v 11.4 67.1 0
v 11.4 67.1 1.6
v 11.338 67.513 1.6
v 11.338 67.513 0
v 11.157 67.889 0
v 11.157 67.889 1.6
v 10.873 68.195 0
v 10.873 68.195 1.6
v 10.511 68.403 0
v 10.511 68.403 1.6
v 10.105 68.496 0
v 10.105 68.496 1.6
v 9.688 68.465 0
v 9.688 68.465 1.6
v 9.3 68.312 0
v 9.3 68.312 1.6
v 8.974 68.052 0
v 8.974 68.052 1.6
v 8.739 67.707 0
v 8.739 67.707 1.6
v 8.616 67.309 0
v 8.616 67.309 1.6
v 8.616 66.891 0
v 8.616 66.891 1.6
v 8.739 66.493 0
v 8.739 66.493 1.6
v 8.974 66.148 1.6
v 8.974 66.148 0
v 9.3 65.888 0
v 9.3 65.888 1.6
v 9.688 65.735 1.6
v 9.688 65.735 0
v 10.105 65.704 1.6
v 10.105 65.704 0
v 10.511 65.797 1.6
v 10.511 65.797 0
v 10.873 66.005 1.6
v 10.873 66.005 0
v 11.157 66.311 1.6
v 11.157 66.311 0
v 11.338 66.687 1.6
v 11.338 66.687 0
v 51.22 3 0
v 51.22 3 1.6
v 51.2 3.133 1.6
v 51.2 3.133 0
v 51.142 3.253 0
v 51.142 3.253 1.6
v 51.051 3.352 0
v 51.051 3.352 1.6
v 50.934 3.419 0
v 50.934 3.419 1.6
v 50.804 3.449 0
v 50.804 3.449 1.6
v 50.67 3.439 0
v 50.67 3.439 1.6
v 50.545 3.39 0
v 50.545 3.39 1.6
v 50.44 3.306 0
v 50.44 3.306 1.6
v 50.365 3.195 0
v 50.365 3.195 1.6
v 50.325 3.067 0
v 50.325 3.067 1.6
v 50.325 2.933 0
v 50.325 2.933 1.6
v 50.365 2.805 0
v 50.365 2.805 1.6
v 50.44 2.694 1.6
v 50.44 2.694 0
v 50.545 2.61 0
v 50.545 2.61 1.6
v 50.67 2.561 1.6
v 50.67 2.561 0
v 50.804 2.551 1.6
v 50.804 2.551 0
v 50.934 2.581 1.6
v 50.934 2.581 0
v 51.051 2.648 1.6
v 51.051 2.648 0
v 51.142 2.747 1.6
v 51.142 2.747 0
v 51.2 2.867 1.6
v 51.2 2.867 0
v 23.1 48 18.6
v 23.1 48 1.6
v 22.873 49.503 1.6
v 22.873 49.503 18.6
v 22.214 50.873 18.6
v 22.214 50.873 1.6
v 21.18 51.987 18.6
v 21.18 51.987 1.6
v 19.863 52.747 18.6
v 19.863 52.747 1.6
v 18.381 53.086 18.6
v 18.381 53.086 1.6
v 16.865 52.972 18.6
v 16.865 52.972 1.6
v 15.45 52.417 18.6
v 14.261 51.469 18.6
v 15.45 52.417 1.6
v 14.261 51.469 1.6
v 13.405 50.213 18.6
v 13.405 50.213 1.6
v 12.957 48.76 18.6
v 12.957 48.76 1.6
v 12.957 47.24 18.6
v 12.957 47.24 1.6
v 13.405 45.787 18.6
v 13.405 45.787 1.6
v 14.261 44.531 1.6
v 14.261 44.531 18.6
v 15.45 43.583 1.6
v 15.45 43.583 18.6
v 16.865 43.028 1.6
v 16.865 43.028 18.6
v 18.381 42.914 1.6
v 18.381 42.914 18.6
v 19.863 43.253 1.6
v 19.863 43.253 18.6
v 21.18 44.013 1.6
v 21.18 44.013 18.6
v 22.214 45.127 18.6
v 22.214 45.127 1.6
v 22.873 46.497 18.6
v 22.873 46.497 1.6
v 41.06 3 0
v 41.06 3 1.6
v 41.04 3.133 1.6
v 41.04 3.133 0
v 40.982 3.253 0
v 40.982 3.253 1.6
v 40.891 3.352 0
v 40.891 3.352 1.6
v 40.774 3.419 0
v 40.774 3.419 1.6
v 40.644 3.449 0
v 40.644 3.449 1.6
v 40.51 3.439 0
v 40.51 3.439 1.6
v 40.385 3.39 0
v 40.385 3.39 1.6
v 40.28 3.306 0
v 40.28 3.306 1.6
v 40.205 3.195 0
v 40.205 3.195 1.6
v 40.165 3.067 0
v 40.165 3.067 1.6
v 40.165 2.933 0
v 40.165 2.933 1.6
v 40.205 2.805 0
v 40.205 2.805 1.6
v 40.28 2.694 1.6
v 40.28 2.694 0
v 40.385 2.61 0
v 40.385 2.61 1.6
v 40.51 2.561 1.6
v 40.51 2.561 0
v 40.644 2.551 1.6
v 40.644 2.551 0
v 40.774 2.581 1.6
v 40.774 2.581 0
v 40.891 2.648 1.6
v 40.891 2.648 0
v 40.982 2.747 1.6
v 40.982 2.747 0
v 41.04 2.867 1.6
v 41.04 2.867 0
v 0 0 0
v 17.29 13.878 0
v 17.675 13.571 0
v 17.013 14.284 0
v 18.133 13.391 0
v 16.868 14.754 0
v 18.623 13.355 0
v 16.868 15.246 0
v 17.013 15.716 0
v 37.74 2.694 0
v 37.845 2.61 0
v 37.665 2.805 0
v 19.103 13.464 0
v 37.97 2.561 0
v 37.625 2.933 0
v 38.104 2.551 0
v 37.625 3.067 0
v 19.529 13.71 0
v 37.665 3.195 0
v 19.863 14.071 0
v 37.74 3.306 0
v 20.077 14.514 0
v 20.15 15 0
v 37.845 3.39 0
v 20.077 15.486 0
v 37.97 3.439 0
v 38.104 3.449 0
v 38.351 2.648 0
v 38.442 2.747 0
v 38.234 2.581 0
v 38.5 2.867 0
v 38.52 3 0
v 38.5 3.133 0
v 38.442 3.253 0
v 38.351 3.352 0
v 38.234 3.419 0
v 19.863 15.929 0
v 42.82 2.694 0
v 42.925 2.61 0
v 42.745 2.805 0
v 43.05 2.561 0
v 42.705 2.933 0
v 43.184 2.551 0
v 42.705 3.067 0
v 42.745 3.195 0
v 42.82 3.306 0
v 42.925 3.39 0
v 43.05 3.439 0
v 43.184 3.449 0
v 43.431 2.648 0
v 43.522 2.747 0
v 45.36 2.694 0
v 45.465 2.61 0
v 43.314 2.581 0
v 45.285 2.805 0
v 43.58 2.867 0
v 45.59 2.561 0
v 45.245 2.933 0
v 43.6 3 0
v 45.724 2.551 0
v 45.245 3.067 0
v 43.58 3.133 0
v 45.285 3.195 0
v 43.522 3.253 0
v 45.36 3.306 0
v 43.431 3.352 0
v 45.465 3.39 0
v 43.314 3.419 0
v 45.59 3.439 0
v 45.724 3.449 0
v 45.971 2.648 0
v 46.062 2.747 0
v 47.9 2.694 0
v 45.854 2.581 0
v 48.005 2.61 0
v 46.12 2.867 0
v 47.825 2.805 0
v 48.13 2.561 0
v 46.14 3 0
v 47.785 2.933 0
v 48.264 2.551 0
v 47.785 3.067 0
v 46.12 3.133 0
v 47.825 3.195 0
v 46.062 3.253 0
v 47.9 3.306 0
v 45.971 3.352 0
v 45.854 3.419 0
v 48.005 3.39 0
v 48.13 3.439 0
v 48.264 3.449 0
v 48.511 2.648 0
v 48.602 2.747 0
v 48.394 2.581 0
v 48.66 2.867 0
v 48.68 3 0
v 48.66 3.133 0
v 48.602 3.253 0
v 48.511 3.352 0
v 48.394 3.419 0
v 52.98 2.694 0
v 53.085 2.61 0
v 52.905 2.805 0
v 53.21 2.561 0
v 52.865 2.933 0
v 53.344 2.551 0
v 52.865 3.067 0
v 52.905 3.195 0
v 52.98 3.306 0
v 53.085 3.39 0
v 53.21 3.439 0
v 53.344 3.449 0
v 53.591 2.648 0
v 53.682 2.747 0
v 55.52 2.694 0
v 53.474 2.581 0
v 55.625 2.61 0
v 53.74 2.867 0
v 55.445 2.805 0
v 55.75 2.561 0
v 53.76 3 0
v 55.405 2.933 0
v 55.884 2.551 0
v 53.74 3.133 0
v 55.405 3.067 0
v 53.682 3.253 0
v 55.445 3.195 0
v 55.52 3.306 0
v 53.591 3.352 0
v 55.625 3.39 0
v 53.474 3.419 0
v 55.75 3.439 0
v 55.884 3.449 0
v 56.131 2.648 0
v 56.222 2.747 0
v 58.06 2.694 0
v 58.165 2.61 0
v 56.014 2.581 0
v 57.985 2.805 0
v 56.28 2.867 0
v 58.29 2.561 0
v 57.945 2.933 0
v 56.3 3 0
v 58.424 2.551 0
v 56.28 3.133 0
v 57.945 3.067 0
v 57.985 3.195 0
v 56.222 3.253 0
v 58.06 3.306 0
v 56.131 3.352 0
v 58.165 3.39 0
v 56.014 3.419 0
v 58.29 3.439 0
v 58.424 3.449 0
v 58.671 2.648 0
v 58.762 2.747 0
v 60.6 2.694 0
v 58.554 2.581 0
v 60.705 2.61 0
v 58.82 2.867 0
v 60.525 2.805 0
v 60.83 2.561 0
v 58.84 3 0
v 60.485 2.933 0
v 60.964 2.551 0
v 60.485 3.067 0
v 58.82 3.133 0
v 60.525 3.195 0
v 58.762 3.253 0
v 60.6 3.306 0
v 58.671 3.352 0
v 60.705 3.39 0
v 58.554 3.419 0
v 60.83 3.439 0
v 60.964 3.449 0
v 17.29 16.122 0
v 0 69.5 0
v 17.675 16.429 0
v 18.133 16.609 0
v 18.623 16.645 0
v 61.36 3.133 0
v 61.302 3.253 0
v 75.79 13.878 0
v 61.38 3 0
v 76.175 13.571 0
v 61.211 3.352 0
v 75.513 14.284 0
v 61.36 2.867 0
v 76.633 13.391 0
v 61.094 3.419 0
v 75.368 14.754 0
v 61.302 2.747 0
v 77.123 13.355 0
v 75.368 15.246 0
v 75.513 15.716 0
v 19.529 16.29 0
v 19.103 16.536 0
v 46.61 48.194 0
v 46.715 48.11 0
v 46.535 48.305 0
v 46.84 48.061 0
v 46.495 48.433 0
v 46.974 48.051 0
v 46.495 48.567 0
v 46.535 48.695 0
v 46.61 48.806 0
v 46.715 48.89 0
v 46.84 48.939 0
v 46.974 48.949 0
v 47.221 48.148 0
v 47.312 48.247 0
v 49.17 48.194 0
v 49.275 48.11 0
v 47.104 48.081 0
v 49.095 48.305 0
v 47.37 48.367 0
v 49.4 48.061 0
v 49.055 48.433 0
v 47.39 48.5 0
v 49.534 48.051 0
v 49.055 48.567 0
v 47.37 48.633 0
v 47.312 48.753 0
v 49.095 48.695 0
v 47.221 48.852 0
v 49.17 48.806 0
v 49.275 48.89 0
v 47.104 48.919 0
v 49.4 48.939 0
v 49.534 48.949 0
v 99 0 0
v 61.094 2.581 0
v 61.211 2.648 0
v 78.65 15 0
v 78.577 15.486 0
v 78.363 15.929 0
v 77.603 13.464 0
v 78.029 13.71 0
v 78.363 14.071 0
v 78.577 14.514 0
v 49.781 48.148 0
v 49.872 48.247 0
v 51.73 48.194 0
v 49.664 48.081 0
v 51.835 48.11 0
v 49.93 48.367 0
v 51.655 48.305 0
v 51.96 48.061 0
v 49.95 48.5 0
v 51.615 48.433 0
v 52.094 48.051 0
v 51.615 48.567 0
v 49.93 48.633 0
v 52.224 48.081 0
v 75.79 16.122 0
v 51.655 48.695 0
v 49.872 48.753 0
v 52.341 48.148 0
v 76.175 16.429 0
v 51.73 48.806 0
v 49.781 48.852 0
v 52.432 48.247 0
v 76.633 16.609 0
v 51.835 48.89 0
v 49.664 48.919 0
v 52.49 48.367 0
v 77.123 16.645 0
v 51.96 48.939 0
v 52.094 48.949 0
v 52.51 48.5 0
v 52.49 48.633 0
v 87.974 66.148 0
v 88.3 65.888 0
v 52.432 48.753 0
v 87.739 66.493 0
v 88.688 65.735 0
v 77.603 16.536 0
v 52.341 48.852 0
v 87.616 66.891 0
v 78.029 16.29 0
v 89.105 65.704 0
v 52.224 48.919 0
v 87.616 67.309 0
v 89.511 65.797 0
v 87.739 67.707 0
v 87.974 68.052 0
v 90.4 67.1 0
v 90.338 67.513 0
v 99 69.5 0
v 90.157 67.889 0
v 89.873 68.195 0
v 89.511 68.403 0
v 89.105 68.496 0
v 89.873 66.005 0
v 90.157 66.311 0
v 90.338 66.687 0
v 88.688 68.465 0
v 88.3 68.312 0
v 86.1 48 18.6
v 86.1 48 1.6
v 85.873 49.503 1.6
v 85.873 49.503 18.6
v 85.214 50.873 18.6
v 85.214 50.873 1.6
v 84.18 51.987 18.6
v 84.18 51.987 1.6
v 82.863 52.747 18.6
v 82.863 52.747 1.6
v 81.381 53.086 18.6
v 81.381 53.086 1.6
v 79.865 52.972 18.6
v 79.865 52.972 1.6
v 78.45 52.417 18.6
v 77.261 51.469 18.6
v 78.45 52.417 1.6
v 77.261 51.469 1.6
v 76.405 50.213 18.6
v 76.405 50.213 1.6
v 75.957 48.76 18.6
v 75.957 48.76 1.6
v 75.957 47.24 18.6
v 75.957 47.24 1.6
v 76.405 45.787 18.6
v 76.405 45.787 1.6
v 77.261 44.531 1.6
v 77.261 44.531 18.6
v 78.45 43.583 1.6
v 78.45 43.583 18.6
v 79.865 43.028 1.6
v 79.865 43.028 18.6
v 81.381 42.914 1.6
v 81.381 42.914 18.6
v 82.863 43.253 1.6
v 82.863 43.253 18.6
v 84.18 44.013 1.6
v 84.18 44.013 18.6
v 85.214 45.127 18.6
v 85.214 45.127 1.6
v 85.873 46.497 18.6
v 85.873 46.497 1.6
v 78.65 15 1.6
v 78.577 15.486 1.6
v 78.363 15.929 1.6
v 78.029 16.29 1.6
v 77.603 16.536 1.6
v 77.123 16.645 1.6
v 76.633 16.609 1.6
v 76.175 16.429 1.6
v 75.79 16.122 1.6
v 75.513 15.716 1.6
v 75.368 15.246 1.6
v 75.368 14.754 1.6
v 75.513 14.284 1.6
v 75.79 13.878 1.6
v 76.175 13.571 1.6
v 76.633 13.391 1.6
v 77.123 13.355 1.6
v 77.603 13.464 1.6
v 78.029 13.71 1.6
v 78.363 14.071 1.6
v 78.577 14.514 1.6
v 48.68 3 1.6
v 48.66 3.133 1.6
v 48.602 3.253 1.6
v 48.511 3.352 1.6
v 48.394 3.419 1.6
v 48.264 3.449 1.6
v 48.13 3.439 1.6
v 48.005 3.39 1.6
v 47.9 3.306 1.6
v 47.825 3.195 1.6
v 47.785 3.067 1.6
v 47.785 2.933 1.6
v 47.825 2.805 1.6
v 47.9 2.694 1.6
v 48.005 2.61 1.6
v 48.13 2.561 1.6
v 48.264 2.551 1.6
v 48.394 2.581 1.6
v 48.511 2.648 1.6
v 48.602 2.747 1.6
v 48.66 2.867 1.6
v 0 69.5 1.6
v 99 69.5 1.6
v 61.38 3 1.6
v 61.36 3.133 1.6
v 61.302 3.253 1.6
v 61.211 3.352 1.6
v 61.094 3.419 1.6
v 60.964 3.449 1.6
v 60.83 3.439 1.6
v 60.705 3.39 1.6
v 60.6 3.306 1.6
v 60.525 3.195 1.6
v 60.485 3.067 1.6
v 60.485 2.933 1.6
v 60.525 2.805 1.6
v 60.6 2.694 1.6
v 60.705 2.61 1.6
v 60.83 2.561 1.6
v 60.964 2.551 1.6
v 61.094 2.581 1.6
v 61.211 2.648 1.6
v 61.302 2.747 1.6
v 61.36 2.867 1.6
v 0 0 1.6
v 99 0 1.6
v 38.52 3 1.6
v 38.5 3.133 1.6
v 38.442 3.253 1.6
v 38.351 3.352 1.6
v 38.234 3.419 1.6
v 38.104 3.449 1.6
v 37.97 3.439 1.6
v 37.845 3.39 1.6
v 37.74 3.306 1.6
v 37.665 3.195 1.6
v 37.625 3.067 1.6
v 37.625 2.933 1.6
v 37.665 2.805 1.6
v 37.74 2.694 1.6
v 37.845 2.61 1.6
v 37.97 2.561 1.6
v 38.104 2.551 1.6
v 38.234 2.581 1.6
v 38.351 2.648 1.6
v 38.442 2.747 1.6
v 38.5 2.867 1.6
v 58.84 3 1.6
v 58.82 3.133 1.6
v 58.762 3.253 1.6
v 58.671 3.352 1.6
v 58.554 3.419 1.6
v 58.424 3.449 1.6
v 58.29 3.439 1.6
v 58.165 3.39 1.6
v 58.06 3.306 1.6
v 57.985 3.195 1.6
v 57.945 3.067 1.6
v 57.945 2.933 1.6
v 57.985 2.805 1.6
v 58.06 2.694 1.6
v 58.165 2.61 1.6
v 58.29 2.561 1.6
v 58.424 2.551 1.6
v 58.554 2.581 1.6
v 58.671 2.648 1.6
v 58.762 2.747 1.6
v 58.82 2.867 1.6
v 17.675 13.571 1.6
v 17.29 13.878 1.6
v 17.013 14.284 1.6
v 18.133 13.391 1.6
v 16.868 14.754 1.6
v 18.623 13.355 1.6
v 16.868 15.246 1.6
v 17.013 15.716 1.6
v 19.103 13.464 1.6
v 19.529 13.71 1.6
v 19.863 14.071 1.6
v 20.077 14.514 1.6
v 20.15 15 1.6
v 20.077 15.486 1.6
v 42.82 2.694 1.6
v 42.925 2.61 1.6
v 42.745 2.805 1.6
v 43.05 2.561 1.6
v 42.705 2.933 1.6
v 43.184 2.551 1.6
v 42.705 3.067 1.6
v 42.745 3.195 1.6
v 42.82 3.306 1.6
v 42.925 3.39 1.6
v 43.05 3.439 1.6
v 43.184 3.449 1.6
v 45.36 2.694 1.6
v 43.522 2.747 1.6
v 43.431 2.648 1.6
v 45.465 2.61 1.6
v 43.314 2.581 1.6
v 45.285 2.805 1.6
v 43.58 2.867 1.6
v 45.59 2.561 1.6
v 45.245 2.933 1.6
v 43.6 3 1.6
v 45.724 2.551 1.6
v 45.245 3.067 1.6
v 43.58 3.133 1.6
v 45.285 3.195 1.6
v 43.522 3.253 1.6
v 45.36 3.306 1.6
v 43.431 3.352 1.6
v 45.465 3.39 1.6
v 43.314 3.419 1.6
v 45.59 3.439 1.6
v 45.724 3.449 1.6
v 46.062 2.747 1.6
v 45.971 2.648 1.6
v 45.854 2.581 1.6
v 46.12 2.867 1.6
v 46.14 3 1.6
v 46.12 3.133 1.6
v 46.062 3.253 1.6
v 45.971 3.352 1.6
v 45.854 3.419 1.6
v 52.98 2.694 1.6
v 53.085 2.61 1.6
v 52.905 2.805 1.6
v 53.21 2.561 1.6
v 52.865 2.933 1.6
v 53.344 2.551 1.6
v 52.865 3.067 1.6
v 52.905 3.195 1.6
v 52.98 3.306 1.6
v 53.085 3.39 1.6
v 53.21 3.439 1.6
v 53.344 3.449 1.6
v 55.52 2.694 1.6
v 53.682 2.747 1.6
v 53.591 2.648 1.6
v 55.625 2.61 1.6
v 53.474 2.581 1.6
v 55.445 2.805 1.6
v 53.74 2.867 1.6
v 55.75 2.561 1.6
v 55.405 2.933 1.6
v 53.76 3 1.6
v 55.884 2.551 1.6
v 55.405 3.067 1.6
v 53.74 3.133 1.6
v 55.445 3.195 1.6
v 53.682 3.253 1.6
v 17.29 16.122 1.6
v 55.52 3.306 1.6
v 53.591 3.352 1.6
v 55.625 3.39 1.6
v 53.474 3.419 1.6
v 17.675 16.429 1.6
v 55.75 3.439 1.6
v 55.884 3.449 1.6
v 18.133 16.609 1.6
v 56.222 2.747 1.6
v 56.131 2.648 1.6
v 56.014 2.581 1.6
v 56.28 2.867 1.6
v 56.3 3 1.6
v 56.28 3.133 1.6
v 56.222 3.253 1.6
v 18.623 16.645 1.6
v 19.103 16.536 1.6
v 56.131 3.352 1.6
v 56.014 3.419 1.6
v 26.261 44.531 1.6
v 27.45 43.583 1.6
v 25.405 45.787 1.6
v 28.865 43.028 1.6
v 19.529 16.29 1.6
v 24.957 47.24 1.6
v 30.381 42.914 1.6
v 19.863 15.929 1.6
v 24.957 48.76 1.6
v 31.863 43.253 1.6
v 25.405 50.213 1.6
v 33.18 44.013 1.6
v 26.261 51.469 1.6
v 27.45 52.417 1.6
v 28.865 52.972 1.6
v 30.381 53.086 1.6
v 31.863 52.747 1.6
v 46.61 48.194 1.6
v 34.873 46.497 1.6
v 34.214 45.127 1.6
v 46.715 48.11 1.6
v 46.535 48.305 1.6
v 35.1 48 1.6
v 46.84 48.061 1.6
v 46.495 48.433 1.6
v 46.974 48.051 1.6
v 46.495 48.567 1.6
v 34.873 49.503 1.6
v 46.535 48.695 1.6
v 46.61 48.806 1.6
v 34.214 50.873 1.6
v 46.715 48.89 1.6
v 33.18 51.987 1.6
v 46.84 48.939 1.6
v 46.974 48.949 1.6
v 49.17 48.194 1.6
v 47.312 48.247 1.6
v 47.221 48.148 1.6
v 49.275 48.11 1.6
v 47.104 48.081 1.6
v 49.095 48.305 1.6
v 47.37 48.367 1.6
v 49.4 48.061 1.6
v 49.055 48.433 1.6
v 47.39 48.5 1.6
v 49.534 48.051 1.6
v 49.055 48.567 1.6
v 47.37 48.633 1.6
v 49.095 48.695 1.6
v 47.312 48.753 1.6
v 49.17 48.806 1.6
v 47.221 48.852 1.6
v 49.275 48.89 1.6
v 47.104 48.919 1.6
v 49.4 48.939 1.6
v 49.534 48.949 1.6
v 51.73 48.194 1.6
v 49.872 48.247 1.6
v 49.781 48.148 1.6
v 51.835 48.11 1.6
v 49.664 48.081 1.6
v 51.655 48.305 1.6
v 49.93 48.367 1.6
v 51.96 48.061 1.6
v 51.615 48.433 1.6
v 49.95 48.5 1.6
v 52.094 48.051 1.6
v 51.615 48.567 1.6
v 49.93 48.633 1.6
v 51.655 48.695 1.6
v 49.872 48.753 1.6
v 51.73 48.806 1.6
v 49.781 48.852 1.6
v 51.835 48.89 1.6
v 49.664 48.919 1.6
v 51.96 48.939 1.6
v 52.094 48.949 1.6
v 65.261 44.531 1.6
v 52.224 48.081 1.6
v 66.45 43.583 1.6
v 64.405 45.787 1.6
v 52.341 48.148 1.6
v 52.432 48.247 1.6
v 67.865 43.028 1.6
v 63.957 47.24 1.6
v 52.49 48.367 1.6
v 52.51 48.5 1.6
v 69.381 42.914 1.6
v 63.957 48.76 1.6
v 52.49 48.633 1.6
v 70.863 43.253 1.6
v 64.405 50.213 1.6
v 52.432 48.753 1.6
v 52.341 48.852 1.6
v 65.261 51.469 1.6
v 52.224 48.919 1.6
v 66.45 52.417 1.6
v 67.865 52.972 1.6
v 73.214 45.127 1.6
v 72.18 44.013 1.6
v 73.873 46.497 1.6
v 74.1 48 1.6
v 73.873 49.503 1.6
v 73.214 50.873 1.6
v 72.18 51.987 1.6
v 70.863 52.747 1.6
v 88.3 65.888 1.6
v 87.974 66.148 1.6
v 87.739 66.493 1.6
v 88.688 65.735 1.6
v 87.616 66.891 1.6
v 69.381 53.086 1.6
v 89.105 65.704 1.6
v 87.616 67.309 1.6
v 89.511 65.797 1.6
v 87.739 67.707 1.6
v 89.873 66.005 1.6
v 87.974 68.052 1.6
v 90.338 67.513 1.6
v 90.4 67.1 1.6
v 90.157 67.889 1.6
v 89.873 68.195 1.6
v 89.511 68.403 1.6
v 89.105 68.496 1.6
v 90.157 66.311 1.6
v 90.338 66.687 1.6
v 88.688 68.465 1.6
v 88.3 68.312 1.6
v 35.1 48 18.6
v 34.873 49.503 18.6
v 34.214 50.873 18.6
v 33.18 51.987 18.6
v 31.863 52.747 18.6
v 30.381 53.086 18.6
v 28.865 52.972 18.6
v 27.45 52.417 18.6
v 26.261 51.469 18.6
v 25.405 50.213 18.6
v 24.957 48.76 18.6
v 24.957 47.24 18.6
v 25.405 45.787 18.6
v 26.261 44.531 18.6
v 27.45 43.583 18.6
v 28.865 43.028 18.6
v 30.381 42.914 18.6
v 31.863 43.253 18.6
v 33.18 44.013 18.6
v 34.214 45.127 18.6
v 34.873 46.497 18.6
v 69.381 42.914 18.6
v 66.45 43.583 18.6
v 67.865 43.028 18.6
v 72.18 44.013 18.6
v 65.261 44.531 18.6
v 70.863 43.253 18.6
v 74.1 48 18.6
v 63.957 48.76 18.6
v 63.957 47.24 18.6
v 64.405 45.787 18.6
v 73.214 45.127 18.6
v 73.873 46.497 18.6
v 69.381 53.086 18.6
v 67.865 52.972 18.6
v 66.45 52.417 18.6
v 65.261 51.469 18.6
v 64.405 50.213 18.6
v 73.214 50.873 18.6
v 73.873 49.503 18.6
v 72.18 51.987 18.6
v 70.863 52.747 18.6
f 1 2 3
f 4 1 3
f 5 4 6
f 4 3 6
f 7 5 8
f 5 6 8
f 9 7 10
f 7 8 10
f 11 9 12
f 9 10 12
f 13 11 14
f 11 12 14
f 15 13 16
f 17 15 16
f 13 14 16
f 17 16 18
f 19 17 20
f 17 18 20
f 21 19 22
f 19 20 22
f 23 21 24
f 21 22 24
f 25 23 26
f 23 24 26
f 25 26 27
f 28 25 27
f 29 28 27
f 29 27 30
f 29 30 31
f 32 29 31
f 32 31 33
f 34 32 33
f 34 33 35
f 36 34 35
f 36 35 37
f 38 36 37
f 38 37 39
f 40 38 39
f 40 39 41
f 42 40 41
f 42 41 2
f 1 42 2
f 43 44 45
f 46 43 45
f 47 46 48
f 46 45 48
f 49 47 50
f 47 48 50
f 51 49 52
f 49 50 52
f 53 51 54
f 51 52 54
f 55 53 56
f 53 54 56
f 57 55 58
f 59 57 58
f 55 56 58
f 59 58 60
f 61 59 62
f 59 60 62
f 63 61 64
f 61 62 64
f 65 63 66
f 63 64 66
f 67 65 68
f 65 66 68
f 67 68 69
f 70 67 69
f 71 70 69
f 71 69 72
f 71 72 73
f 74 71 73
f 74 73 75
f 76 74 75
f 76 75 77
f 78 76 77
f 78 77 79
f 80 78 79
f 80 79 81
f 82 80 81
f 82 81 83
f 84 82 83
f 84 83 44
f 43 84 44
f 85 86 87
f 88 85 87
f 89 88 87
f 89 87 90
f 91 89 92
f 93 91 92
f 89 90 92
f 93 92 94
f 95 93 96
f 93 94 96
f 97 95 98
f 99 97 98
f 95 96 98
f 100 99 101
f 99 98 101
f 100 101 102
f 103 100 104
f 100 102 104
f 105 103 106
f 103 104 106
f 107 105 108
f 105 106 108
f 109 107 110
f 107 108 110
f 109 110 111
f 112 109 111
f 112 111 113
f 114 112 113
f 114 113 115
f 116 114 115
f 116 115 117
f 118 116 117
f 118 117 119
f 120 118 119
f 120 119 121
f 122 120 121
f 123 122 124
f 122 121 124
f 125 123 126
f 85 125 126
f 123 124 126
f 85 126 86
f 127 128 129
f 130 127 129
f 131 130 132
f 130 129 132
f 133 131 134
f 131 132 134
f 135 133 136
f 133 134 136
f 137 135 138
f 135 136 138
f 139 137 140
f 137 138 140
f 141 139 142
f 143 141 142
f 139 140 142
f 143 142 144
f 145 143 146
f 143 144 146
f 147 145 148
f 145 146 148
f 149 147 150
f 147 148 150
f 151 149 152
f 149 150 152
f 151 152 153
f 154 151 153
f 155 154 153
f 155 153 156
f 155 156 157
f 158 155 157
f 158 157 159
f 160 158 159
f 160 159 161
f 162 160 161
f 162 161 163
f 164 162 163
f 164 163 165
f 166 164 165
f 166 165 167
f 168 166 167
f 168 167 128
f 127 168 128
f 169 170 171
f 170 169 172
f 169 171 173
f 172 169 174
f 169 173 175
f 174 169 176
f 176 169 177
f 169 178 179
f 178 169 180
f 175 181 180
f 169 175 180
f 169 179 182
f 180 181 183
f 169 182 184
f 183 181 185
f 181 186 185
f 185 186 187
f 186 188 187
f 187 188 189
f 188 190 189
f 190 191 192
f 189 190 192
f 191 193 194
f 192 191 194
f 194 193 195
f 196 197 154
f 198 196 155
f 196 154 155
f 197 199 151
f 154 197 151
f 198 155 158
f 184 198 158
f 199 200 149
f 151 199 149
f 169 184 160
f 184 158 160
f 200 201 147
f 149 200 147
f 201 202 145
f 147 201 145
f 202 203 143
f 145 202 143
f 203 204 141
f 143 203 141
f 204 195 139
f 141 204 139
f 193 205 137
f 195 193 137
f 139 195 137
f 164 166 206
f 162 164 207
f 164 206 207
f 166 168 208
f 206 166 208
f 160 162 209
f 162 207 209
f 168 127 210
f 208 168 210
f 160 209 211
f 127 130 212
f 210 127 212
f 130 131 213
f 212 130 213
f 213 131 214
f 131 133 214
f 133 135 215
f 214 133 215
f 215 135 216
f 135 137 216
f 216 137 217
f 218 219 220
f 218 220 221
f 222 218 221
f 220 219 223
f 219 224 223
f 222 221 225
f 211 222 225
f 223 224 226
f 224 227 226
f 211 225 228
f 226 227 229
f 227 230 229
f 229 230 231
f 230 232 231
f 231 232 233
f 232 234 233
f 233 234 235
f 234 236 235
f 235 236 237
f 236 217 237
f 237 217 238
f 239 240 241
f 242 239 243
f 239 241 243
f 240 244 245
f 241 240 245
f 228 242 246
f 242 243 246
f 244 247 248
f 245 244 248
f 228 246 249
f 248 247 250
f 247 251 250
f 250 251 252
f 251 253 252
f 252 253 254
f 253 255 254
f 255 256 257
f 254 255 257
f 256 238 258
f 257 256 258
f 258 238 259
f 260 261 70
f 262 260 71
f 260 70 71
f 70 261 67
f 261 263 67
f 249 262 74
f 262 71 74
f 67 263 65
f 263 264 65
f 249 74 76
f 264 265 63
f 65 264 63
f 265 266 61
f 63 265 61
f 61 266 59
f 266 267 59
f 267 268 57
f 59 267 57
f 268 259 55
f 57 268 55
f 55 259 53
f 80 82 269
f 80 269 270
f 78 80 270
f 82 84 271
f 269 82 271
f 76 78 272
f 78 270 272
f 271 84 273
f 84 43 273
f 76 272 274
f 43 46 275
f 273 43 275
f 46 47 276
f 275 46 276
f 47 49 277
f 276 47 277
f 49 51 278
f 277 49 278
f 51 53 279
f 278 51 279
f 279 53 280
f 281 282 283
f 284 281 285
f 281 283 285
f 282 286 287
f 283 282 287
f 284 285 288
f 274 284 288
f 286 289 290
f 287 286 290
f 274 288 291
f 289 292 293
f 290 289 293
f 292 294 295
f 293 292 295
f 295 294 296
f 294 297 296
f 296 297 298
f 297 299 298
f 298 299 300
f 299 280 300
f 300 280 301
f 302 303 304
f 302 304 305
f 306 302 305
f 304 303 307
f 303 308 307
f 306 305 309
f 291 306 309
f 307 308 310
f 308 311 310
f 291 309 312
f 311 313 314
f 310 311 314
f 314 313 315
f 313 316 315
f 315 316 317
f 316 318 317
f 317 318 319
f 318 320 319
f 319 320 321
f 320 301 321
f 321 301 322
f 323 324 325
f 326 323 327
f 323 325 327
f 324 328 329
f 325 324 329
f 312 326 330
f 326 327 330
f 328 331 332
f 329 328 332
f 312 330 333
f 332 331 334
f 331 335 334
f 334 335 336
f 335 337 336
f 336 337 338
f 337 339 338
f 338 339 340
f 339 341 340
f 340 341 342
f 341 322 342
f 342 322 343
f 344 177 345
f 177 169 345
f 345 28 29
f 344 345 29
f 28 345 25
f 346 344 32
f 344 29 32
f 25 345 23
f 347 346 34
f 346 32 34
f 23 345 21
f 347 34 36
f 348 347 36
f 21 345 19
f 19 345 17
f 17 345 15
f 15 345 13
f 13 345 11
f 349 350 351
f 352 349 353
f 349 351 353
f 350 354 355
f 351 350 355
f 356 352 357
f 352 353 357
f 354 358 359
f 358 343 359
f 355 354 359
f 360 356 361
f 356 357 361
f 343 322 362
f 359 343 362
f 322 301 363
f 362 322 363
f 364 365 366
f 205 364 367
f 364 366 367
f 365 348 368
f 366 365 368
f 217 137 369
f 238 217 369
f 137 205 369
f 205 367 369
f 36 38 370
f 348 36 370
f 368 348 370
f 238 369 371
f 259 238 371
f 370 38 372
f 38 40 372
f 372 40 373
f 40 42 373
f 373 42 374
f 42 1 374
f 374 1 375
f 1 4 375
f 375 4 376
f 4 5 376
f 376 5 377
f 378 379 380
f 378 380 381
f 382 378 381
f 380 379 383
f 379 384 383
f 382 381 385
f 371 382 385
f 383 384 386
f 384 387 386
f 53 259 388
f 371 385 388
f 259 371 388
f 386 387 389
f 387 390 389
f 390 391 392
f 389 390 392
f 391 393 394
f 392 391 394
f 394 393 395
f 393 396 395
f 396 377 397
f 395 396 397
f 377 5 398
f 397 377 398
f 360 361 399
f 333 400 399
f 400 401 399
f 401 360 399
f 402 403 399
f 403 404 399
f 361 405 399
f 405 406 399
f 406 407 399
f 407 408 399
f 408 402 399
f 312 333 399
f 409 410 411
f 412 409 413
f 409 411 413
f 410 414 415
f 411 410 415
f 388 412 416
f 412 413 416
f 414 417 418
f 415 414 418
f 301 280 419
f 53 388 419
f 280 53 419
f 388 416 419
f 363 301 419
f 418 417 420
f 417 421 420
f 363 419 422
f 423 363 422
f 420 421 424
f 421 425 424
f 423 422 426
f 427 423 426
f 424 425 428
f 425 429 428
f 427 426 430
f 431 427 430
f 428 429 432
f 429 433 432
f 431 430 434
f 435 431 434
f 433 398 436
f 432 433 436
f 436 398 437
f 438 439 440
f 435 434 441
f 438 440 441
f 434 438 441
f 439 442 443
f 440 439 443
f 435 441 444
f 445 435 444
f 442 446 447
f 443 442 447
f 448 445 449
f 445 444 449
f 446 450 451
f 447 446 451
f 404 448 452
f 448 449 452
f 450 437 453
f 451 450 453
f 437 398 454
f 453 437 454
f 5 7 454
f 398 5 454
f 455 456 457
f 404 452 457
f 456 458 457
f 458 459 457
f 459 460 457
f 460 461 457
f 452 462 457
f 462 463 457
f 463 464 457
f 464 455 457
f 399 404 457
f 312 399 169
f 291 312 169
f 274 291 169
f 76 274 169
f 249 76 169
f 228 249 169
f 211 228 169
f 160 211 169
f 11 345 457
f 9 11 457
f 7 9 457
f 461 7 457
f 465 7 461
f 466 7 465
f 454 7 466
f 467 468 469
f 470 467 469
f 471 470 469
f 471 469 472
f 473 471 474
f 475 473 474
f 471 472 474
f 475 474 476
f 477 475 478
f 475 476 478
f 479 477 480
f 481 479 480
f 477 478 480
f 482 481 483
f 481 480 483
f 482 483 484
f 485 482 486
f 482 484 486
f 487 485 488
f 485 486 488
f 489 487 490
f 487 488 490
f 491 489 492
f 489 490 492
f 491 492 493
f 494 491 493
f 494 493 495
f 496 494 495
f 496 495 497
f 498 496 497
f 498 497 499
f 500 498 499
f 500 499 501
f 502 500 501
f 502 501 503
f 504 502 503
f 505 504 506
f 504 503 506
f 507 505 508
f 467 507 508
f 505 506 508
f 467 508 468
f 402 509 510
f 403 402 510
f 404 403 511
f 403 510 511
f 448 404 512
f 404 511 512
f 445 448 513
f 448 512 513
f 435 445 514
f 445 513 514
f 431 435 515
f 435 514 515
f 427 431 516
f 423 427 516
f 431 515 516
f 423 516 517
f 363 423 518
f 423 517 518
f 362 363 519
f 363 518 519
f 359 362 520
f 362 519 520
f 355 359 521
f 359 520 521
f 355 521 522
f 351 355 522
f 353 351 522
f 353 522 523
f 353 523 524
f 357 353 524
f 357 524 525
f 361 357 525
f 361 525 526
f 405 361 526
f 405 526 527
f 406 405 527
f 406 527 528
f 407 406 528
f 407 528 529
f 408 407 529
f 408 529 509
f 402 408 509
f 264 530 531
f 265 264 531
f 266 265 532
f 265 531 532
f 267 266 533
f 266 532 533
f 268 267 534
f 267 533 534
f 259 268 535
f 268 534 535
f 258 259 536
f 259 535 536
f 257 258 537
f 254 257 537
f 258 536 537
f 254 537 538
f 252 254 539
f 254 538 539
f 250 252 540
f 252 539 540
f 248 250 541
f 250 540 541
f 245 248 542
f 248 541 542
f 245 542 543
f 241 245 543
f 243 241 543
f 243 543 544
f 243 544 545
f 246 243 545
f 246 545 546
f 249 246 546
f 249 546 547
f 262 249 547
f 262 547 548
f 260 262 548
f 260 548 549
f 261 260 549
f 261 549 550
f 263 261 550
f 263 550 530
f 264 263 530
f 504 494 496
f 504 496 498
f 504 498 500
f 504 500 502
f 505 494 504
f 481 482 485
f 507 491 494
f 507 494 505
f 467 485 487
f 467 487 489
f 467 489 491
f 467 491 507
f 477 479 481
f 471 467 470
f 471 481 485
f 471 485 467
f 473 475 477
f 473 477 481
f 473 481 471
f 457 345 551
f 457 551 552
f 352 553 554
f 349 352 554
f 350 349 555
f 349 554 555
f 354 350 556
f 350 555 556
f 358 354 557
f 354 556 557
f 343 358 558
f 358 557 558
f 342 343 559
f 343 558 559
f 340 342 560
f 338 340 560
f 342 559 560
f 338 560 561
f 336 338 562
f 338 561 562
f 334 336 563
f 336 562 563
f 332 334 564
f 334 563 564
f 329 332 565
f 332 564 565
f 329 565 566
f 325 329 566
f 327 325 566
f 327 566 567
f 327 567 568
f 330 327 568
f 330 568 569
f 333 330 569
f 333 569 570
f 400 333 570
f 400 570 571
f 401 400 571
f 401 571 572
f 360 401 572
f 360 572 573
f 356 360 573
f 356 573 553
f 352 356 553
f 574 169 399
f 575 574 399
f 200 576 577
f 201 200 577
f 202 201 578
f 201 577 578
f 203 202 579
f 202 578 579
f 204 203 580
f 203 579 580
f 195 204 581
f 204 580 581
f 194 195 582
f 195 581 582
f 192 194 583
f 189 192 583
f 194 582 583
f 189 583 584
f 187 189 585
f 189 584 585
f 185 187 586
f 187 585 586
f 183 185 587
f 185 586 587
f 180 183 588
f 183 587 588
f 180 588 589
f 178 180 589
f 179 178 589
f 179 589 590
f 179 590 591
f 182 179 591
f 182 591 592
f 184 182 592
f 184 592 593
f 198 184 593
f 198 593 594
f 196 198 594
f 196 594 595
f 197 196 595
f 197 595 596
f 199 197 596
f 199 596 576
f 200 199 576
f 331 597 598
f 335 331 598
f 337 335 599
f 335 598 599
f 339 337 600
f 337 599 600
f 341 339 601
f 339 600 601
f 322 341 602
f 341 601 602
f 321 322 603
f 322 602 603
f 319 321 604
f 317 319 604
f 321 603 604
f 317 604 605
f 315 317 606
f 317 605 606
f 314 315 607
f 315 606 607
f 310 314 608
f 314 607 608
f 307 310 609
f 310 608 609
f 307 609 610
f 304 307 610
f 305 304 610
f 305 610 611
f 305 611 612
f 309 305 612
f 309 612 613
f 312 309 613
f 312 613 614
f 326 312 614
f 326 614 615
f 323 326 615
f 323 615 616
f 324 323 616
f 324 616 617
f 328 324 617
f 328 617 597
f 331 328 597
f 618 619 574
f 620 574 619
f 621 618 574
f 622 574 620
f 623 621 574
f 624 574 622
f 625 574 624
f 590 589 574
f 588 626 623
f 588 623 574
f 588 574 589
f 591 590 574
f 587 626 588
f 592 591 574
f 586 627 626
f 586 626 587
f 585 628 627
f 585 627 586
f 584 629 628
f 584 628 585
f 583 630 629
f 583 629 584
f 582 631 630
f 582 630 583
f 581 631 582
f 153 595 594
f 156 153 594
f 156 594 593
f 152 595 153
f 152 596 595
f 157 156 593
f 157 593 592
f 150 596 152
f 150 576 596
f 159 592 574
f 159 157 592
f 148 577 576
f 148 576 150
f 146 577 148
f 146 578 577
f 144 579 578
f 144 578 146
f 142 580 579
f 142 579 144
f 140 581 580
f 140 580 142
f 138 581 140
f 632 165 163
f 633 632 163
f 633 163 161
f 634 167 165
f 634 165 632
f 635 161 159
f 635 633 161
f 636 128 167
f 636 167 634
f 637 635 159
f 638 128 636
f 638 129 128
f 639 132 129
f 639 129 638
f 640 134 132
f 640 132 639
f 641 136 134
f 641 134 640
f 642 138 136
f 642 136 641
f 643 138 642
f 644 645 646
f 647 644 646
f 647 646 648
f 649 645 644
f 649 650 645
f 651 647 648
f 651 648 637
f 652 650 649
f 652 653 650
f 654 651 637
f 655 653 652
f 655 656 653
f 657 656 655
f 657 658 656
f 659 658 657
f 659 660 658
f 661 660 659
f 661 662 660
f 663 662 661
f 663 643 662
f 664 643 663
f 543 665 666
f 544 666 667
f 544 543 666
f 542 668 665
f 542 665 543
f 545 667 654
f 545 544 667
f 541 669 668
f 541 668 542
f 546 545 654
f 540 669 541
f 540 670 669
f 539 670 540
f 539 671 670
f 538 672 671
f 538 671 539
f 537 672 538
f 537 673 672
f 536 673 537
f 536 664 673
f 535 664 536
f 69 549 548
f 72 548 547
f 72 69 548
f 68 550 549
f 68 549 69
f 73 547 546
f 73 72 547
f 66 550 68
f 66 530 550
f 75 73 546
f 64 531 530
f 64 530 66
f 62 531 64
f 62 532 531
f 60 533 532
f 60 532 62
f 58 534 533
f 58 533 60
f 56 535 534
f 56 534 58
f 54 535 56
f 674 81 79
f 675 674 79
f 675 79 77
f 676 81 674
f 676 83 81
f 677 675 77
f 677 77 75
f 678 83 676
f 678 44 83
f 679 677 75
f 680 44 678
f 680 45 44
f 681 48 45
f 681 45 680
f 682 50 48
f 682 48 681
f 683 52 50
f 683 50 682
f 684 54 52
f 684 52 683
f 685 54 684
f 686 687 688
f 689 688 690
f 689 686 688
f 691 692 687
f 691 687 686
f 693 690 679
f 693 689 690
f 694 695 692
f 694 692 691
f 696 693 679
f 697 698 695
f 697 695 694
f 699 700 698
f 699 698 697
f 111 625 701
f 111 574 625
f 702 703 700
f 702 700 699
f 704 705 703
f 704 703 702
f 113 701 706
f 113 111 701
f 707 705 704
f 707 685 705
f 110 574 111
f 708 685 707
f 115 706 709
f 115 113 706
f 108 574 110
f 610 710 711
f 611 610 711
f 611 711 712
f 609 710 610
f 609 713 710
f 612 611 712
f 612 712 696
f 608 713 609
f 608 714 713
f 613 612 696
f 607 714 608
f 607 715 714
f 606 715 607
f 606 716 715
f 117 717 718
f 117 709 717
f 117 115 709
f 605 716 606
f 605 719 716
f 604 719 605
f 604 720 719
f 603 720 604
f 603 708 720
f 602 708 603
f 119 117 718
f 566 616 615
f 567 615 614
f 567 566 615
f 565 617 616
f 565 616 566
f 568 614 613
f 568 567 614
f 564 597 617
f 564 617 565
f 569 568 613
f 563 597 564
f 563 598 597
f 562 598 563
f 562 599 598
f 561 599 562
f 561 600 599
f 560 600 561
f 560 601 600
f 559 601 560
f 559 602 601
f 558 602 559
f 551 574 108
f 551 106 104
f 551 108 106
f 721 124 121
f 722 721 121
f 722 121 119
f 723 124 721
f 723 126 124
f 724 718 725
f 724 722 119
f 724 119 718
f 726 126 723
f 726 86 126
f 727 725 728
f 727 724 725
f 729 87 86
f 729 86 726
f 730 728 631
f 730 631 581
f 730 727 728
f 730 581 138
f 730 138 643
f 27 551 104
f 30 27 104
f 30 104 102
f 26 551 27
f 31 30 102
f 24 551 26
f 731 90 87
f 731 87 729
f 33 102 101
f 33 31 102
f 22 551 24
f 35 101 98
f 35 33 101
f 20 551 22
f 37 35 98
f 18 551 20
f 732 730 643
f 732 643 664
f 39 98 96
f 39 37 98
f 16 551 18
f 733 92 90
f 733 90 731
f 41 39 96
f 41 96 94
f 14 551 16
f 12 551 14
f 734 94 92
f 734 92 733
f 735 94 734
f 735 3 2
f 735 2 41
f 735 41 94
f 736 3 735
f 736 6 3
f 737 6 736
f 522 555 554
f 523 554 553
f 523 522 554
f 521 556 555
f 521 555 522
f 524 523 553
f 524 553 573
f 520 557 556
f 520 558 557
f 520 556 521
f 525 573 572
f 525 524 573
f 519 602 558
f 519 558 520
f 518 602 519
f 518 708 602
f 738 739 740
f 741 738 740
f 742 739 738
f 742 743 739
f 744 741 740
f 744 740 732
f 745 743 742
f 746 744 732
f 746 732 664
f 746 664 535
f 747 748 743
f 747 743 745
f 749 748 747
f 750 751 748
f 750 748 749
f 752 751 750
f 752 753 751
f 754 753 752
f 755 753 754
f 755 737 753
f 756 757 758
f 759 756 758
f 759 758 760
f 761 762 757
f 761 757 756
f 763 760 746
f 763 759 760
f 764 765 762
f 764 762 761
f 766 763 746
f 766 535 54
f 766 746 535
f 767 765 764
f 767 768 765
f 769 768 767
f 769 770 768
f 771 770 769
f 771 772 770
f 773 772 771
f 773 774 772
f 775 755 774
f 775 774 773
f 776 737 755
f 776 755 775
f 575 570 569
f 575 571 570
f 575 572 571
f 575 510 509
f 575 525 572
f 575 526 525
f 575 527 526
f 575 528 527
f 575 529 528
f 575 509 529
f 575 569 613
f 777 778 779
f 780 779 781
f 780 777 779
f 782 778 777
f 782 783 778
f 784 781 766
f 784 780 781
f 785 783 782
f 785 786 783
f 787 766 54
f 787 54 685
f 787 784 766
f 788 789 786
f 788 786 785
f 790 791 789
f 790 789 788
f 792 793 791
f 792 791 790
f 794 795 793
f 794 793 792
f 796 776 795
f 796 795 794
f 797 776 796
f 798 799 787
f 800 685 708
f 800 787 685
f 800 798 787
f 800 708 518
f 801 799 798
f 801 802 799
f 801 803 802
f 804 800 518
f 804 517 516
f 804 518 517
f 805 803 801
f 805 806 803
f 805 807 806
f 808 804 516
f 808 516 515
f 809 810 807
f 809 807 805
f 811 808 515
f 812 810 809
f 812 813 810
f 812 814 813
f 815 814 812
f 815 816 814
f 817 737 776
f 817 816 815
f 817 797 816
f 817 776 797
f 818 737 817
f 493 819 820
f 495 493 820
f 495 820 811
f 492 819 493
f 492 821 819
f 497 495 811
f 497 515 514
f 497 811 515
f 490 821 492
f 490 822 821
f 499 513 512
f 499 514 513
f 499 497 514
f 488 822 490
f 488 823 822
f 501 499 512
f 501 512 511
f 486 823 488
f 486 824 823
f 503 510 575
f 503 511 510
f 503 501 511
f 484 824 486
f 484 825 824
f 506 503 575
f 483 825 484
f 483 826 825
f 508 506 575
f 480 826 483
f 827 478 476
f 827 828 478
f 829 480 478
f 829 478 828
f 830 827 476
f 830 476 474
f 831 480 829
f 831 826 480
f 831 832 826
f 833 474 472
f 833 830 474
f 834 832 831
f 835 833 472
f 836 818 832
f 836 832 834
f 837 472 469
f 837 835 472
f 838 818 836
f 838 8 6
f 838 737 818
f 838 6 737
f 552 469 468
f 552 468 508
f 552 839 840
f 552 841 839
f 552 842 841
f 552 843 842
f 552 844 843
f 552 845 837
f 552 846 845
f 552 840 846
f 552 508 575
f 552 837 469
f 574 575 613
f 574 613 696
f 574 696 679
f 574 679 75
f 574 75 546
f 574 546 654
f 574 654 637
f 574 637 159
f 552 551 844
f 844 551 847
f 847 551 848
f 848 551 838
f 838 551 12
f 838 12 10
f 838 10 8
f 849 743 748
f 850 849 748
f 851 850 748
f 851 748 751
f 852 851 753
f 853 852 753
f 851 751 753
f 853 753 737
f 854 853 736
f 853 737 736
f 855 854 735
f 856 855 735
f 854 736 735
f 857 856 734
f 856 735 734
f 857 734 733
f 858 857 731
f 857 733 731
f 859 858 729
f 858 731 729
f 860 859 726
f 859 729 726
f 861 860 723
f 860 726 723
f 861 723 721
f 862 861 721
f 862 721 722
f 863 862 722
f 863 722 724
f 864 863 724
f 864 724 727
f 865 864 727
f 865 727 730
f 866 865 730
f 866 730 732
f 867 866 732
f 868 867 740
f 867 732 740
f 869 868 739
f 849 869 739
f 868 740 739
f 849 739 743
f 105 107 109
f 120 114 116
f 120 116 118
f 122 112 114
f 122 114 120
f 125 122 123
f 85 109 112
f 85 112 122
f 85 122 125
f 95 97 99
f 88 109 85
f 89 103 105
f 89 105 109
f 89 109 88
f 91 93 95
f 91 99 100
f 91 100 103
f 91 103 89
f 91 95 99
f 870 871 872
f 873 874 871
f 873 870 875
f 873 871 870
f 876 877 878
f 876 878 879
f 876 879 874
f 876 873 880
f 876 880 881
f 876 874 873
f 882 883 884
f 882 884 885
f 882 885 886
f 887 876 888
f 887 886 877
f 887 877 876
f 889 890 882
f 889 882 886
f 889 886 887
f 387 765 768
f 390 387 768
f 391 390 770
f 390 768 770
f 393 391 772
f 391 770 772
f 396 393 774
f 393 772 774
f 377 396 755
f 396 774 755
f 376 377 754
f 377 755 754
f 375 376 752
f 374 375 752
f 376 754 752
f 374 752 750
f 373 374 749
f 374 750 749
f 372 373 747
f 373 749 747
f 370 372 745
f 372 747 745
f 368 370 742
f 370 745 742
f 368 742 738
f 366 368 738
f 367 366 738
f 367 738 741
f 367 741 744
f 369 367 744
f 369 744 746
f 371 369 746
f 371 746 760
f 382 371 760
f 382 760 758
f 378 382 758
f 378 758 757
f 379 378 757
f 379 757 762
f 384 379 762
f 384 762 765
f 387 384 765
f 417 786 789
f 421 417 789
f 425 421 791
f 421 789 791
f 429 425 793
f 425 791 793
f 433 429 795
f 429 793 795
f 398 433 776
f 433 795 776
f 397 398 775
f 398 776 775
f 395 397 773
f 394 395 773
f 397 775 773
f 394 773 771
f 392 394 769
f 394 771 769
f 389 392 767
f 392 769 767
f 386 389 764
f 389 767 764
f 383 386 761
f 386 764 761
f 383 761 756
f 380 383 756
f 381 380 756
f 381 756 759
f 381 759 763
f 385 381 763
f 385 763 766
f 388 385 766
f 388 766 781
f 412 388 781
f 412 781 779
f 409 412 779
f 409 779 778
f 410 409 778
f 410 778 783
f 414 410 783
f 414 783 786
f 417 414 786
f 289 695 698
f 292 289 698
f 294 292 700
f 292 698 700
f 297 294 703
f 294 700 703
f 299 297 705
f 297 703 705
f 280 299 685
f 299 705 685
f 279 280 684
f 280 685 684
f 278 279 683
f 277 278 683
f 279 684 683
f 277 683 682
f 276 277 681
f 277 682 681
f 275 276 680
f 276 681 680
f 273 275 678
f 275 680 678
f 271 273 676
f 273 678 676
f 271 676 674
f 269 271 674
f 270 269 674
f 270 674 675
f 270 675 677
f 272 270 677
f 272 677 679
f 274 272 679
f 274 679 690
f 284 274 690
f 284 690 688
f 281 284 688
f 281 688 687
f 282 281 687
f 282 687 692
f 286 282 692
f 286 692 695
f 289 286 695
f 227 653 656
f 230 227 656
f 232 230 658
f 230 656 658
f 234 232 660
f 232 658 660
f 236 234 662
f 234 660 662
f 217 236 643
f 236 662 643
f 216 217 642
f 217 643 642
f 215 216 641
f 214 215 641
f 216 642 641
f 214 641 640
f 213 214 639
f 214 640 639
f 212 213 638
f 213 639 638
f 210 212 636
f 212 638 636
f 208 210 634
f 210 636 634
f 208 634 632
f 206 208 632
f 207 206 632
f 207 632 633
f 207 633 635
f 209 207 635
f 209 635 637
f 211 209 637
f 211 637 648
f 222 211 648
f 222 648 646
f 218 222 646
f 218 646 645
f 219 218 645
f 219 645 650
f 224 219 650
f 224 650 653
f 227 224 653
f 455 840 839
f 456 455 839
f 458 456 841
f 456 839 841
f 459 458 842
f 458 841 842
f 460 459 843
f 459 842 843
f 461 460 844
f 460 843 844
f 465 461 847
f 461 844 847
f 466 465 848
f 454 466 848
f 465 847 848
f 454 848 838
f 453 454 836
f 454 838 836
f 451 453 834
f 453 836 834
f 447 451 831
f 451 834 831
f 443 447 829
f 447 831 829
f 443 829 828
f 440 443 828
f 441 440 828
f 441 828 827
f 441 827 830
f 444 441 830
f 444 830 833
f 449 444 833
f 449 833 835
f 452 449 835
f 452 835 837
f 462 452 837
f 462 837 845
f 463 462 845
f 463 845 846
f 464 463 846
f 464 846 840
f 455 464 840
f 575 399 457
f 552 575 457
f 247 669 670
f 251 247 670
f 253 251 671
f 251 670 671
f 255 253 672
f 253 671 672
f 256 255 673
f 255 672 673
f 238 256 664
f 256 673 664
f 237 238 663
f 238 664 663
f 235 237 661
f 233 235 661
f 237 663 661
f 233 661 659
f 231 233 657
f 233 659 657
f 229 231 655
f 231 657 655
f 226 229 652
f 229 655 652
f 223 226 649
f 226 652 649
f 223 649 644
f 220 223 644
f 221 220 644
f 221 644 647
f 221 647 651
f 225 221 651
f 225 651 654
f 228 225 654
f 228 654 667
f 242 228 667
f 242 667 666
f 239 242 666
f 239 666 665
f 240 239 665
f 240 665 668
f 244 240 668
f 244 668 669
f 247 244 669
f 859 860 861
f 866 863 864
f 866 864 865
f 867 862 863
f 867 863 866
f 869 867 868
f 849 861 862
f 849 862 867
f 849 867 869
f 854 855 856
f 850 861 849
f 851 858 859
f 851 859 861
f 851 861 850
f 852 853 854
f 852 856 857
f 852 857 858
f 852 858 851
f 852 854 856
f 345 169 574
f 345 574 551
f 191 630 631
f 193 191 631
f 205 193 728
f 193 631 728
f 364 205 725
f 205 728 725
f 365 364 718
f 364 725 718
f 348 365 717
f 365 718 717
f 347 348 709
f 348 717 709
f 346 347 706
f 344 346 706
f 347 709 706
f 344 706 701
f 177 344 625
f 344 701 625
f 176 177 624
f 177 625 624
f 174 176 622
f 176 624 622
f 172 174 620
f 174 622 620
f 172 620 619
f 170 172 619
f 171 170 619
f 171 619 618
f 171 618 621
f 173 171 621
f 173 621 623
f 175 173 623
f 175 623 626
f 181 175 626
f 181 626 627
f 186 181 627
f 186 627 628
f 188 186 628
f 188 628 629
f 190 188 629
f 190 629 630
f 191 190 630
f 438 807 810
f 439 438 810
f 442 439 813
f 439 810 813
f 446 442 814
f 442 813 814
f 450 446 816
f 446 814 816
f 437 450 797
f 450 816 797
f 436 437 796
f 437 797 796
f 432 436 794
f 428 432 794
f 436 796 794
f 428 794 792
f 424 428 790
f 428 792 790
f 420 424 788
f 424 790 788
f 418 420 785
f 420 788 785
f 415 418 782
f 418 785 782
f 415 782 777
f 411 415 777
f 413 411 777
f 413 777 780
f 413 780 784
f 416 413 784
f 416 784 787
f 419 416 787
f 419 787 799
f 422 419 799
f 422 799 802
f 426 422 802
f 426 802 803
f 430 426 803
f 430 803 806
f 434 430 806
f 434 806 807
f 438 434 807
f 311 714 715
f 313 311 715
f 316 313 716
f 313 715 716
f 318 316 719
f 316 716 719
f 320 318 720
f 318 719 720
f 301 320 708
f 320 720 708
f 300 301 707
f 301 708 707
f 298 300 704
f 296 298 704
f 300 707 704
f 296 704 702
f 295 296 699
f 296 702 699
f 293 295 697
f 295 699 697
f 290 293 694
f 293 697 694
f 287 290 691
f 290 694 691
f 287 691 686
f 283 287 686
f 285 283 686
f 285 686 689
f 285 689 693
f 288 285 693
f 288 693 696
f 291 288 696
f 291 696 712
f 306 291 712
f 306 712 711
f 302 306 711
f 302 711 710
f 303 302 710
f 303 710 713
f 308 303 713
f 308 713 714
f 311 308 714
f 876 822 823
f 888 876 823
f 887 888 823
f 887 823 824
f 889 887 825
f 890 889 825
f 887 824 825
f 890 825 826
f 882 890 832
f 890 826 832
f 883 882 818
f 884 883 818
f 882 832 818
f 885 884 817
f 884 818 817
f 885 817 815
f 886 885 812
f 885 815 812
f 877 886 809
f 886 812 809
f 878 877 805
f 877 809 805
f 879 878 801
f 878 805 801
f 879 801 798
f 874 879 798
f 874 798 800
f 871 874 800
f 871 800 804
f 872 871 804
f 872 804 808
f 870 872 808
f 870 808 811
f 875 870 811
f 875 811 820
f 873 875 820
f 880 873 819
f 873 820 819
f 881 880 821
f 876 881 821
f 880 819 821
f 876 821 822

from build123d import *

# Parameters (mm, degrees)
SKETCH1_W               = 99
SKETCH1_H               = 69.5
BOSS_EXTRUDE1_DEPTH     = 1.6
SKETCH2_R               = 5.1
BOSS_EXTRUDE2_DEPTH     = 17
SKETCH3_R               = 1.4
SKETCH3_R_2             = 1.65
SKETCH3_R_3             = 0.45
CUT_EXTRUDE1_DEPTH      = 18
CUT_EXTRUDE1_DEPTH_BACK = 2.6


with BuildPart() as part:
    # Sketch1 → Boss-Extrude1 (new body)
    with BuildSketch(Plane.XY):
        with Locations((49.5, 34.75)):
            Rectangle(SKETCH1_W, SKETCH1_H)
    extrude(amount=BOSS_EXTRUDE1_DEPTH)

    # Sketch2 → Boss-Extrude2 (add)
    with BuildSketch(Plane.XY.offset(1.6)):
        with Locations((18, 48)):
            Circle(SKETCH2_R)
        with Locations((30, 48)):
            Circle(SKETCH2_R)
        with Locations((69, 48)):
            Circle(SKETCH2_R)
        with Locations((81, 48)):
            Circle(SKETCH2_R)
    extrude(amount=BOSS_EXTRUDE2_DEPTH)

    # Sketch3 → Cut-Extrude1 (cut, two sides)
    with BuildSketch(Plane.XY.offset(1.6)) as cut_extrude1_sk:
        with Locations((10, 67.1)):
            Circle(SKETCH3_R)
        with Locations((89, 67.1)):
            Circle(SKETCH3_R)
        with Locations((18.5, 15)):
            Circle(SKETCH3_R_2)
        with Locations((77, 15)):
            Circle(SKETCH3_R_2)
        with Locations((49.5, 48.5)):
            Circle(SKETCH3_R_3)
        with Locations((52.06, 48.5)):
            Circle(SKETCH3_R_3)
        with Locations((46.94, 48.5)):
            Circle(SKETCH3_R_3)
        with Locations((43.15, 3)):
            Circle(SKETCH3_R_3)
        with Locations((45.69, 3)):
            Circle(SKETCH3_R_3)
        with Locations((48.23, 3)):
            Circle(SKETCH3_R_3)
        with Locations((50.77, 3)):
            Circle(SKETCH3_R_3)
        with Locations((53.31, 3)):
            Circle(SKETCH3_R_3)
        with Locations((55.85, 3)):
            Circle(SKETCH3_R_3)
        with Locations((58.39, 3)):
            Circle(SKETCH3_R_3)
        with Locations((60.93, 3)):
            Circle(SKETCH3_R_3)
        with Locations((40.61, 3)):
            Circle(SKETCH3_R_3)
        with Locations((38.07, 3)):
            Circle(SKETCH3_R_3)
    extrude(amount=CUT_EXTRUDE1_DEPTH, mode=Mode.SUBTRACT)
    extrude(cut_extrude1_sk.sketch, amount=-CUT_EXTRUDE1_DEPTH_BACK, mode=Mode.SUBTRACT)


solid = part.part
